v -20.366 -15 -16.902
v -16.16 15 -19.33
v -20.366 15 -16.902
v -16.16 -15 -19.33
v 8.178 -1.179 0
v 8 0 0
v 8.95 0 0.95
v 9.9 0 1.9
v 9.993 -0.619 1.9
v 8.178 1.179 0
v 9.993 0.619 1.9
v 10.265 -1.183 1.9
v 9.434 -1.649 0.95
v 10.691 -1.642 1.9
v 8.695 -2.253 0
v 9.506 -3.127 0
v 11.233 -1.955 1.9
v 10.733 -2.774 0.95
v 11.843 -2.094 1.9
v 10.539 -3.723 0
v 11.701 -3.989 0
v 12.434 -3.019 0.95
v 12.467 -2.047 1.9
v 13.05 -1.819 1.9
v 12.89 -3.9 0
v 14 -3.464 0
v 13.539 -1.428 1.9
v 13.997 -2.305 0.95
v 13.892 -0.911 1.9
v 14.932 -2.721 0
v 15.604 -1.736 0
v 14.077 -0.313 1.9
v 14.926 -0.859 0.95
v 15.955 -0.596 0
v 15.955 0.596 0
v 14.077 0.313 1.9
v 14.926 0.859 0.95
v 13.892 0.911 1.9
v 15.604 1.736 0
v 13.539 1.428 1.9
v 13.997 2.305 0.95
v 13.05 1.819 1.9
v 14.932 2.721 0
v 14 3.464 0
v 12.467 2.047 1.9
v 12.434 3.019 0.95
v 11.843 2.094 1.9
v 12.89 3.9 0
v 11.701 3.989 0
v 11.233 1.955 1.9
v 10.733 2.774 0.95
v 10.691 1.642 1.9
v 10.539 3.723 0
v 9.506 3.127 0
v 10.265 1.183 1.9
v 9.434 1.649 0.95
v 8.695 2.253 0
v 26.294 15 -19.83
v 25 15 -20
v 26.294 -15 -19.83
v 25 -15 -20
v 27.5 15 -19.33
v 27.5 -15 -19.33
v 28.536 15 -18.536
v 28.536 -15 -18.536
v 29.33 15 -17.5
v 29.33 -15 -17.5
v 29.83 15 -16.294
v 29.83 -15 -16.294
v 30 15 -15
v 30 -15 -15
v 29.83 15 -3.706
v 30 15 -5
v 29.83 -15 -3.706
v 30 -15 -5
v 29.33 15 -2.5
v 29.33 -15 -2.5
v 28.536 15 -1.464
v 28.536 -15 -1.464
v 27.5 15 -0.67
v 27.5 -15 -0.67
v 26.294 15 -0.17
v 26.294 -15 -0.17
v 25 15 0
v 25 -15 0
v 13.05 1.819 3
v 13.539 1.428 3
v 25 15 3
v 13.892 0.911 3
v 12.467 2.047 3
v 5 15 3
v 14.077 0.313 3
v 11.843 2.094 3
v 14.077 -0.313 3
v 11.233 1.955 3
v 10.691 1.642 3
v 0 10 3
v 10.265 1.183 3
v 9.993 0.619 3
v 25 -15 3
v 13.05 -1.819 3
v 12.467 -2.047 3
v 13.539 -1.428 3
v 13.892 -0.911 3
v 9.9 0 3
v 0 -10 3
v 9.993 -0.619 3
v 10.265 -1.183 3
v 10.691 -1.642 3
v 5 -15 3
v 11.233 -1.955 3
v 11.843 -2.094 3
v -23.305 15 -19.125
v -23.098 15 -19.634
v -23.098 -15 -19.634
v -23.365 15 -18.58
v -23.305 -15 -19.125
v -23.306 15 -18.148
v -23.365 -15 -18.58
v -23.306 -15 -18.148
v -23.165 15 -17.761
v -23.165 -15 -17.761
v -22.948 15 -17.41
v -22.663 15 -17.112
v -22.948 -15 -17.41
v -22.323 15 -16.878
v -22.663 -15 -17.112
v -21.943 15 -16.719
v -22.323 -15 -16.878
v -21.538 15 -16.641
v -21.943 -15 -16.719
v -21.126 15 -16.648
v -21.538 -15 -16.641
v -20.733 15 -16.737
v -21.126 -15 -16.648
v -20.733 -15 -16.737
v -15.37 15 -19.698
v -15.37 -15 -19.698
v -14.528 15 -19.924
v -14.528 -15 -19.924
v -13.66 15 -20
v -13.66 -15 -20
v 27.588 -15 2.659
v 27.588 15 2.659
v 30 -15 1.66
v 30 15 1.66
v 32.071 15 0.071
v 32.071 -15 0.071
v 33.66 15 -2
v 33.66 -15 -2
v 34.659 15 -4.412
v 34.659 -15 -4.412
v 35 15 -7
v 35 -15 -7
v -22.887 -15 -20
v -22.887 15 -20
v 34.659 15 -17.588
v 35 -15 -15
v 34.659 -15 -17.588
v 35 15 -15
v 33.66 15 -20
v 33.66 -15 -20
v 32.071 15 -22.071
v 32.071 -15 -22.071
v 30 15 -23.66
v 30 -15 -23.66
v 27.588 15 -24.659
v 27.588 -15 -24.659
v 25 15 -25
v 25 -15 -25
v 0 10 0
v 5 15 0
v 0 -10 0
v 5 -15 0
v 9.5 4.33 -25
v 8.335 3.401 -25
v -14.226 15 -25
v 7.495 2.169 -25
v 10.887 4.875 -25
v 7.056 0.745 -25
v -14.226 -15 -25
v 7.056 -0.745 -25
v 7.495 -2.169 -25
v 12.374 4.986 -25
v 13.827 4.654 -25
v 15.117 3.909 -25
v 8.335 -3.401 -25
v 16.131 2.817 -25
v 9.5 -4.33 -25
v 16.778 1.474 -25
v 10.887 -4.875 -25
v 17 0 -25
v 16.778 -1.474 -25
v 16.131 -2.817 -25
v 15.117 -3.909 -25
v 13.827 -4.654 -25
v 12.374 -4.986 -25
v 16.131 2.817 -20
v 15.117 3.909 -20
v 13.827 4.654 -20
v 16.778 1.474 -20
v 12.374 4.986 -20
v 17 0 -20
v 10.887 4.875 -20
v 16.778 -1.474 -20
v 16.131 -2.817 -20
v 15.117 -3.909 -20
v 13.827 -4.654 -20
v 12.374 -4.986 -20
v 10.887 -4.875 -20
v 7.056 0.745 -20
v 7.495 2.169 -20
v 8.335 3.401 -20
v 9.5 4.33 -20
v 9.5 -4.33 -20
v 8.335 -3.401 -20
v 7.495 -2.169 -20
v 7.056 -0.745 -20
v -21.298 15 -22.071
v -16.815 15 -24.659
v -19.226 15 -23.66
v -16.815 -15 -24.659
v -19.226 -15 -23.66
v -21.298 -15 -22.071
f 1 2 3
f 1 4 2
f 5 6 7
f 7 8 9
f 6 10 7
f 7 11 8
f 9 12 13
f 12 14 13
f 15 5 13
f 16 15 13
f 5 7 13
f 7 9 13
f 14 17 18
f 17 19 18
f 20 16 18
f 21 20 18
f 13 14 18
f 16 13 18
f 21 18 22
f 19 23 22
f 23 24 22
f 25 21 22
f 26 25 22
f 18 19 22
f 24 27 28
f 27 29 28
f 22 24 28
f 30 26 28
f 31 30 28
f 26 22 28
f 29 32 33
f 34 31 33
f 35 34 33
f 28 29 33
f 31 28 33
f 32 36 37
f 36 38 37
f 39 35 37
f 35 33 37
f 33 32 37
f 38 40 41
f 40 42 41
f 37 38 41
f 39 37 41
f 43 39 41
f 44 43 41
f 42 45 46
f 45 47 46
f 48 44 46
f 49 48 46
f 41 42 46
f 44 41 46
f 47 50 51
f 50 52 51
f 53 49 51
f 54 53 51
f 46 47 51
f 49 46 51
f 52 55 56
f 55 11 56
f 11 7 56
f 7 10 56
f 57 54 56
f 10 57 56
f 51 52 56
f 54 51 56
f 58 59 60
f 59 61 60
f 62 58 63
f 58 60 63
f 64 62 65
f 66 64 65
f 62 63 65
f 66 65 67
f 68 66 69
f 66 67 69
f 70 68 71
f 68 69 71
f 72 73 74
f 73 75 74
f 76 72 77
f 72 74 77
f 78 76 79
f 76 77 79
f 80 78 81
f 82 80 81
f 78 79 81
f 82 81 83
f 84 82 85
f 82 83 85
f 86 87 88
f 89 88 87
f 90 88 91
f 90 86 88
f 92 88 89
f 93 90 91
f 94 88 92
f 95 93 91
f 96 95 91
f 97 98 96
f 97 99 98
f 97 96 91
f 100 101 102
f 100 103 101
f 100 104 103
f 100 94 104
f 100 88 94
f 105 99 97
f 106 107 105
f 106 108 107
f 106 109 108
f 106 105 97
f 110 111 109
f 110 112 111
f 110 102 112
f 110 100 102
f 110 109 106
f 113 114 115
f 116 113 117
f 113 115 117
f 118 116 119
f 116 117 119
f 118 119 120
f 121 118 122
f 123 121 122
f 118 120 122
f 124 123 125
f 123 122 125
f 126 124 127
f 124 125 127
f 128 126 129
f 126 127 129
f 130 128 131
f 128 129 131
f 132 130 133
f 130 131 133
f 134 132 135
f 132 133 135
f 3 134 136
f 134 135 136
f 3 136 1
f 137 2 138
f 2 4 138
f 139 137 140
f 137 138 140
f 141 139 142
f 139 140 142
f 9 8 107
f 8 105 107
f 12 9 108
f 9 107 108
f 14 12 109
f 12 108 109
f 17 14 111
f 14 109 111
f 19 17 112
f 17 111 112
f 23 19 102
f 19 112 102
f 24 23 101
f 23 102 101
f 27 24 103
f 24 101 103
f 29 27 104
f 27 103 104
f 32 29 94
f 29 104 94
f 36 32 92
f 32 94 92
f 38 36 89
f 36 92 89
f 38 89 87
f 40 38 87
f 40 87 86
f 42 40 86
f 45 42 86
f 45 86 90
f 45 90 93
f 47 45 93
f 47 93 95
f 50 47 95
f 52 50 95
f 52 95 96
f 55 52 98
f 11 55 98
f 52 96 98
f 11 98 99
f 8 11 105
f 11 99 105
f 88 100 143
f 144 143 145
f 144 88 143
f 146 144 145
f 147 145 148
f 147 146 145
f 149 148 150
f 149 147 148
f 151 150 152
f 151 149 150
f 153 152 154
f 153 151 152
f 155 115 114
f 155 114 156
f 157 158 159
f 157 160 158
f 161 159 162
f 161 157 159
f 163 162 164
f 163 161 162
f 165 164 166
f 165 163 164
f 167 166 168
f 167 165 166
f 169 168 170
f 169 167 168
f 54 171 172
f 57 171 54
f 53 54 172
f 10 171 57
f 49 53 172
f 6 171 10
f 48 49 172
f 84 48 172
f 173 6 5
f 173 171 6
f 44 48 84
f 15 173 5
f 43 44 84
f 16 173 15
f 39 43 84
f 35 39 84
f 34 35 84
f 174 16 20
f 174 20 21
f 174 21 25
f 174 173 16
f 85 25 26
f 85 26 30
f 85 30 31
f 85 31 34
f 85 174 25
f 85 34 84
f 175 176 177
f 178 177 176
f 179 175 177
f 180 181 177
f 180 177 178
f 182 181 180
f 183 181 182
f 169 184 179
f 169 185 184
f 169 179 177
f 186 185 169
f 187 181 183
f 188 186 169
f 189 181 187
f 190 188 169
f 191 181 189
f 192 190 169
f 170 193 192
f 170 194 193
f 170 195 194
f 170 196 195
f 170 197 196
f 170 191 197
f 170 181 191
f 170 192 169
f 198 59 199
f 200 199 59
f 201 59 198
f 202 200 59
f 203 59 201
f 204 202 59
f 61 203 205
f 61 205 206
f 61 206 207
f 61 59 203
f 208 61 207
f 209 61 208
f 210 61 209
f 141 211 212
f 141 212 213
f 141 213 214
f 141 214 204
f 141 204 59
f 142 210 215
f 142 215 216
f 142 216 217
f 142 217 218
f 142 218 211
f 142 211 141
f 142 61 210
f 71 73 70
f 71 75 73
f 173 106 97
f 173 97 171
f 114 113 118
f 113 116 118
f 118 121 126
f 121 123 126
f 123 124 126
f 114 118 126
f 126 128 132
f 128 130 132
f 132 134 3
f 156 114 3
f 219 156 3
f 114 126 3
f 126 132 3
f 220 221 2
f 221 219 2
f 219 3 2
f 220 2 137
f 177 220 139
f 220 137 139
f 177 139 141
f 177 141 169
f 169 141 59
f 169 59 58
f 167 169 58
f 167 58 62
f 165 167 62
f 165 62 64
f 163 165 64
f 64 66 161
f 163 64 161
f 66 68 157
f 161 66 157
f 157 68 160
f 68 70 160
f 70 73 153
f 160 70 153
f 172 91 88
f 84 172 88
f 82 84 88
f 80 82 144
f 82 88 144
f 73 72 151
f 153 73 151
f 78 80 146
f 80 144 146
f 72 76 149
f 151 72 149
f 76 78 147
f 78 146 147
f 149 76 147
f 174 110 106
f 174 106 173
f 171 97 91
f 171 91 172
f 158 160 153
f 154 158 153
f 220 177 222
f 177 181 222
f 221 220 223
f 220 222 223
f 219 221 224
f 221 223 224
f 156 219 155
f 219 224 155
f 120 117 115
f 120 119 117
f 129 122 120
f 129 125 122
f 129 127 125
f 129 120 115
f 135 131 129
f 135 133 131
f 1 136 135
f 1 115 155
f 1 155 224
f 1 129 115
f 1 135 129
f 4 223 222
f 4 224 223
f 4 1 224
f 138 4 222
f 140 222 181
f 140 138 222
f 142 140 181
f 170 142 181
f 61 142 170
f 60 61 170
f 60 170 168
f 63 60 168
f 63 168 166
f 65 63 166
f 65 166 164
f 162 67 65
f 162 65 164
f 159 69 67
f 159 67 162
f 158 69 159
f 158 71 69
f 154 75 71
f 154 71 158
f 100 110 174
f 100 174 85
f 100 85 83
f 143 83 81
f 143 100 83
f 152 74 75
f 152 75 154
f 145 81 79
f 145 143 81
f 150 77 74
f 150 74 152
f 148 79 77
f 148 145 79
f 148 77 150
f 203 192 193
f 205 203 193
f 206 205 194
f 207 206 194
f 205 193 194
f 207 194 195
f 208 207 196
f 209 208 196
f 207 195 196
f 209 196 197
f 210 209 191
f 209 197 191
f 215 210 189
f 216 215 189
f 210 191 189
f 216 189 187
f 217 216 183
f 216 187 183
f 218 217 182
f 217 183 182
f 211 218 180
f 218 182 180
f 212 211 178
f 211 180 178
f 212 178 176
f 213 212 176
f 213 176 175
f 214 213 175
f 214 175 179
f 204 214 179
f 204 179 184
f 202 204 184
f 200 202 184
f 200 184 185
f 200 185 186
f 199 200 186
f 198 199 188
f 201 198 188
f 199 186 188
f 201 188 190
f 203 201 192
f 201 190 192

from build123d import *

# Parameters (mm, degrees)
F1_DEPTH       = 15
F2_R           = 5
F3_R           = 10
F5_D           = 4.2
F5_CSINK_D     = 8
F5_CSINK_ANGLE = 90
F6_R           = 5
F7_DEPTH       = 5
F8_T1_DEPTH    = 47.7203429425
F9_R           = 2
F10_SIZE       = 5


# Not quite as in the source:
# - a fillet or chamfer that OpenCascade refuses, or shapes differently, is made with other operations: its cross-section is extruded or revolved along the edge and cut away or added


with BuildPart() as f1:
    # F0 (on Front) → F1 (new body, symmetric)
    with BuildSketch(Plane.XZ):
        Polygon((0, 3), (0, 0), (30, 0), (30, -20), (-15, -20), (-23.6602540378, -15), (-25.0838401426, -16.1945305755), (-20, -25), (35, -25), (35, 3), align=None)
    extrude(amount=F1_DEPTH, both=True)

    # F2
    f2_edges = [f1.edges().sort_by_distance(p)[0] for p in [
        (30, 0, 0),
        (30, 0, -20),
        (-15, 0, -20),
    ]]
    fillet(f2_edges, radius=F2_R)

    # F3
    f3_edges = [f1.edges().sort_by_distance(p)[0] for p in [
        (35, 0, 3),
        (35, 0, -25),
        (-20, 0, -25),
    ]]
    fillet(f3_edges, radius=F3_R)

    # F5 (through all)
    with Locations(Plane(origin=(0, 0, 0), x_dir=(1, 0, 0), z_dir=(0, 0, -1))):
        with Locations((12, 0)):
            CounterSinkHole(F5_D / 2, F5_CSINK_D / 2, counter_sink_angle=F5_CSINK_ANGLE)

    # F6 (on face) → F7 (cut, through all)
    with BuildSketch(Plane(origin=(0, 0, -25), x_dir=(1, 0, 0), z_dir=(0, 0, -1))):
        with Locations((12, 0)):
            Circle(F6_R)
    extrude(amount=-F7_DEPTH, mode=Mode.SUBTRACT)

    # F8: fillet of radius 5 on 1 edges, made by hand

    # F8_s2 → F8_t1 (cut)
    with BuildSketch(Plane.XZ.offset(-23.8601714713)):
        with BuildLine():
            ThreePointArc((-23.3118058484, -19.2637840059), (-23.9650654758, -17.171040108), (-23.6602540378, -15))
            Line((-23.6602540378, -15), (-25.0838401426, -16.1945305755))
            Line((-25.0838401426, -16.1945305755), (-23.3118058484, -19.2637840059))
        make_face()
    extrude(amount=F8_T1_DEPTH, mode=Mode.SUBTRACT)

    # F9
    f9_edges = [f1.edges().sort_by_distance(p)[0] for p in [
        (-23.660254, 0, -15),
    ]]
    fillet(f9_edges, radius=F9_R)

    # F10
    f10_edges = [f1.edges().sort_by_distance(p)[0] for p in [
        (0, 15, 1.5),
        (0, -15, 1.5),
    ]]
    chamfer(f10_edges, length=F10_SIZE)


solid = f1.part
